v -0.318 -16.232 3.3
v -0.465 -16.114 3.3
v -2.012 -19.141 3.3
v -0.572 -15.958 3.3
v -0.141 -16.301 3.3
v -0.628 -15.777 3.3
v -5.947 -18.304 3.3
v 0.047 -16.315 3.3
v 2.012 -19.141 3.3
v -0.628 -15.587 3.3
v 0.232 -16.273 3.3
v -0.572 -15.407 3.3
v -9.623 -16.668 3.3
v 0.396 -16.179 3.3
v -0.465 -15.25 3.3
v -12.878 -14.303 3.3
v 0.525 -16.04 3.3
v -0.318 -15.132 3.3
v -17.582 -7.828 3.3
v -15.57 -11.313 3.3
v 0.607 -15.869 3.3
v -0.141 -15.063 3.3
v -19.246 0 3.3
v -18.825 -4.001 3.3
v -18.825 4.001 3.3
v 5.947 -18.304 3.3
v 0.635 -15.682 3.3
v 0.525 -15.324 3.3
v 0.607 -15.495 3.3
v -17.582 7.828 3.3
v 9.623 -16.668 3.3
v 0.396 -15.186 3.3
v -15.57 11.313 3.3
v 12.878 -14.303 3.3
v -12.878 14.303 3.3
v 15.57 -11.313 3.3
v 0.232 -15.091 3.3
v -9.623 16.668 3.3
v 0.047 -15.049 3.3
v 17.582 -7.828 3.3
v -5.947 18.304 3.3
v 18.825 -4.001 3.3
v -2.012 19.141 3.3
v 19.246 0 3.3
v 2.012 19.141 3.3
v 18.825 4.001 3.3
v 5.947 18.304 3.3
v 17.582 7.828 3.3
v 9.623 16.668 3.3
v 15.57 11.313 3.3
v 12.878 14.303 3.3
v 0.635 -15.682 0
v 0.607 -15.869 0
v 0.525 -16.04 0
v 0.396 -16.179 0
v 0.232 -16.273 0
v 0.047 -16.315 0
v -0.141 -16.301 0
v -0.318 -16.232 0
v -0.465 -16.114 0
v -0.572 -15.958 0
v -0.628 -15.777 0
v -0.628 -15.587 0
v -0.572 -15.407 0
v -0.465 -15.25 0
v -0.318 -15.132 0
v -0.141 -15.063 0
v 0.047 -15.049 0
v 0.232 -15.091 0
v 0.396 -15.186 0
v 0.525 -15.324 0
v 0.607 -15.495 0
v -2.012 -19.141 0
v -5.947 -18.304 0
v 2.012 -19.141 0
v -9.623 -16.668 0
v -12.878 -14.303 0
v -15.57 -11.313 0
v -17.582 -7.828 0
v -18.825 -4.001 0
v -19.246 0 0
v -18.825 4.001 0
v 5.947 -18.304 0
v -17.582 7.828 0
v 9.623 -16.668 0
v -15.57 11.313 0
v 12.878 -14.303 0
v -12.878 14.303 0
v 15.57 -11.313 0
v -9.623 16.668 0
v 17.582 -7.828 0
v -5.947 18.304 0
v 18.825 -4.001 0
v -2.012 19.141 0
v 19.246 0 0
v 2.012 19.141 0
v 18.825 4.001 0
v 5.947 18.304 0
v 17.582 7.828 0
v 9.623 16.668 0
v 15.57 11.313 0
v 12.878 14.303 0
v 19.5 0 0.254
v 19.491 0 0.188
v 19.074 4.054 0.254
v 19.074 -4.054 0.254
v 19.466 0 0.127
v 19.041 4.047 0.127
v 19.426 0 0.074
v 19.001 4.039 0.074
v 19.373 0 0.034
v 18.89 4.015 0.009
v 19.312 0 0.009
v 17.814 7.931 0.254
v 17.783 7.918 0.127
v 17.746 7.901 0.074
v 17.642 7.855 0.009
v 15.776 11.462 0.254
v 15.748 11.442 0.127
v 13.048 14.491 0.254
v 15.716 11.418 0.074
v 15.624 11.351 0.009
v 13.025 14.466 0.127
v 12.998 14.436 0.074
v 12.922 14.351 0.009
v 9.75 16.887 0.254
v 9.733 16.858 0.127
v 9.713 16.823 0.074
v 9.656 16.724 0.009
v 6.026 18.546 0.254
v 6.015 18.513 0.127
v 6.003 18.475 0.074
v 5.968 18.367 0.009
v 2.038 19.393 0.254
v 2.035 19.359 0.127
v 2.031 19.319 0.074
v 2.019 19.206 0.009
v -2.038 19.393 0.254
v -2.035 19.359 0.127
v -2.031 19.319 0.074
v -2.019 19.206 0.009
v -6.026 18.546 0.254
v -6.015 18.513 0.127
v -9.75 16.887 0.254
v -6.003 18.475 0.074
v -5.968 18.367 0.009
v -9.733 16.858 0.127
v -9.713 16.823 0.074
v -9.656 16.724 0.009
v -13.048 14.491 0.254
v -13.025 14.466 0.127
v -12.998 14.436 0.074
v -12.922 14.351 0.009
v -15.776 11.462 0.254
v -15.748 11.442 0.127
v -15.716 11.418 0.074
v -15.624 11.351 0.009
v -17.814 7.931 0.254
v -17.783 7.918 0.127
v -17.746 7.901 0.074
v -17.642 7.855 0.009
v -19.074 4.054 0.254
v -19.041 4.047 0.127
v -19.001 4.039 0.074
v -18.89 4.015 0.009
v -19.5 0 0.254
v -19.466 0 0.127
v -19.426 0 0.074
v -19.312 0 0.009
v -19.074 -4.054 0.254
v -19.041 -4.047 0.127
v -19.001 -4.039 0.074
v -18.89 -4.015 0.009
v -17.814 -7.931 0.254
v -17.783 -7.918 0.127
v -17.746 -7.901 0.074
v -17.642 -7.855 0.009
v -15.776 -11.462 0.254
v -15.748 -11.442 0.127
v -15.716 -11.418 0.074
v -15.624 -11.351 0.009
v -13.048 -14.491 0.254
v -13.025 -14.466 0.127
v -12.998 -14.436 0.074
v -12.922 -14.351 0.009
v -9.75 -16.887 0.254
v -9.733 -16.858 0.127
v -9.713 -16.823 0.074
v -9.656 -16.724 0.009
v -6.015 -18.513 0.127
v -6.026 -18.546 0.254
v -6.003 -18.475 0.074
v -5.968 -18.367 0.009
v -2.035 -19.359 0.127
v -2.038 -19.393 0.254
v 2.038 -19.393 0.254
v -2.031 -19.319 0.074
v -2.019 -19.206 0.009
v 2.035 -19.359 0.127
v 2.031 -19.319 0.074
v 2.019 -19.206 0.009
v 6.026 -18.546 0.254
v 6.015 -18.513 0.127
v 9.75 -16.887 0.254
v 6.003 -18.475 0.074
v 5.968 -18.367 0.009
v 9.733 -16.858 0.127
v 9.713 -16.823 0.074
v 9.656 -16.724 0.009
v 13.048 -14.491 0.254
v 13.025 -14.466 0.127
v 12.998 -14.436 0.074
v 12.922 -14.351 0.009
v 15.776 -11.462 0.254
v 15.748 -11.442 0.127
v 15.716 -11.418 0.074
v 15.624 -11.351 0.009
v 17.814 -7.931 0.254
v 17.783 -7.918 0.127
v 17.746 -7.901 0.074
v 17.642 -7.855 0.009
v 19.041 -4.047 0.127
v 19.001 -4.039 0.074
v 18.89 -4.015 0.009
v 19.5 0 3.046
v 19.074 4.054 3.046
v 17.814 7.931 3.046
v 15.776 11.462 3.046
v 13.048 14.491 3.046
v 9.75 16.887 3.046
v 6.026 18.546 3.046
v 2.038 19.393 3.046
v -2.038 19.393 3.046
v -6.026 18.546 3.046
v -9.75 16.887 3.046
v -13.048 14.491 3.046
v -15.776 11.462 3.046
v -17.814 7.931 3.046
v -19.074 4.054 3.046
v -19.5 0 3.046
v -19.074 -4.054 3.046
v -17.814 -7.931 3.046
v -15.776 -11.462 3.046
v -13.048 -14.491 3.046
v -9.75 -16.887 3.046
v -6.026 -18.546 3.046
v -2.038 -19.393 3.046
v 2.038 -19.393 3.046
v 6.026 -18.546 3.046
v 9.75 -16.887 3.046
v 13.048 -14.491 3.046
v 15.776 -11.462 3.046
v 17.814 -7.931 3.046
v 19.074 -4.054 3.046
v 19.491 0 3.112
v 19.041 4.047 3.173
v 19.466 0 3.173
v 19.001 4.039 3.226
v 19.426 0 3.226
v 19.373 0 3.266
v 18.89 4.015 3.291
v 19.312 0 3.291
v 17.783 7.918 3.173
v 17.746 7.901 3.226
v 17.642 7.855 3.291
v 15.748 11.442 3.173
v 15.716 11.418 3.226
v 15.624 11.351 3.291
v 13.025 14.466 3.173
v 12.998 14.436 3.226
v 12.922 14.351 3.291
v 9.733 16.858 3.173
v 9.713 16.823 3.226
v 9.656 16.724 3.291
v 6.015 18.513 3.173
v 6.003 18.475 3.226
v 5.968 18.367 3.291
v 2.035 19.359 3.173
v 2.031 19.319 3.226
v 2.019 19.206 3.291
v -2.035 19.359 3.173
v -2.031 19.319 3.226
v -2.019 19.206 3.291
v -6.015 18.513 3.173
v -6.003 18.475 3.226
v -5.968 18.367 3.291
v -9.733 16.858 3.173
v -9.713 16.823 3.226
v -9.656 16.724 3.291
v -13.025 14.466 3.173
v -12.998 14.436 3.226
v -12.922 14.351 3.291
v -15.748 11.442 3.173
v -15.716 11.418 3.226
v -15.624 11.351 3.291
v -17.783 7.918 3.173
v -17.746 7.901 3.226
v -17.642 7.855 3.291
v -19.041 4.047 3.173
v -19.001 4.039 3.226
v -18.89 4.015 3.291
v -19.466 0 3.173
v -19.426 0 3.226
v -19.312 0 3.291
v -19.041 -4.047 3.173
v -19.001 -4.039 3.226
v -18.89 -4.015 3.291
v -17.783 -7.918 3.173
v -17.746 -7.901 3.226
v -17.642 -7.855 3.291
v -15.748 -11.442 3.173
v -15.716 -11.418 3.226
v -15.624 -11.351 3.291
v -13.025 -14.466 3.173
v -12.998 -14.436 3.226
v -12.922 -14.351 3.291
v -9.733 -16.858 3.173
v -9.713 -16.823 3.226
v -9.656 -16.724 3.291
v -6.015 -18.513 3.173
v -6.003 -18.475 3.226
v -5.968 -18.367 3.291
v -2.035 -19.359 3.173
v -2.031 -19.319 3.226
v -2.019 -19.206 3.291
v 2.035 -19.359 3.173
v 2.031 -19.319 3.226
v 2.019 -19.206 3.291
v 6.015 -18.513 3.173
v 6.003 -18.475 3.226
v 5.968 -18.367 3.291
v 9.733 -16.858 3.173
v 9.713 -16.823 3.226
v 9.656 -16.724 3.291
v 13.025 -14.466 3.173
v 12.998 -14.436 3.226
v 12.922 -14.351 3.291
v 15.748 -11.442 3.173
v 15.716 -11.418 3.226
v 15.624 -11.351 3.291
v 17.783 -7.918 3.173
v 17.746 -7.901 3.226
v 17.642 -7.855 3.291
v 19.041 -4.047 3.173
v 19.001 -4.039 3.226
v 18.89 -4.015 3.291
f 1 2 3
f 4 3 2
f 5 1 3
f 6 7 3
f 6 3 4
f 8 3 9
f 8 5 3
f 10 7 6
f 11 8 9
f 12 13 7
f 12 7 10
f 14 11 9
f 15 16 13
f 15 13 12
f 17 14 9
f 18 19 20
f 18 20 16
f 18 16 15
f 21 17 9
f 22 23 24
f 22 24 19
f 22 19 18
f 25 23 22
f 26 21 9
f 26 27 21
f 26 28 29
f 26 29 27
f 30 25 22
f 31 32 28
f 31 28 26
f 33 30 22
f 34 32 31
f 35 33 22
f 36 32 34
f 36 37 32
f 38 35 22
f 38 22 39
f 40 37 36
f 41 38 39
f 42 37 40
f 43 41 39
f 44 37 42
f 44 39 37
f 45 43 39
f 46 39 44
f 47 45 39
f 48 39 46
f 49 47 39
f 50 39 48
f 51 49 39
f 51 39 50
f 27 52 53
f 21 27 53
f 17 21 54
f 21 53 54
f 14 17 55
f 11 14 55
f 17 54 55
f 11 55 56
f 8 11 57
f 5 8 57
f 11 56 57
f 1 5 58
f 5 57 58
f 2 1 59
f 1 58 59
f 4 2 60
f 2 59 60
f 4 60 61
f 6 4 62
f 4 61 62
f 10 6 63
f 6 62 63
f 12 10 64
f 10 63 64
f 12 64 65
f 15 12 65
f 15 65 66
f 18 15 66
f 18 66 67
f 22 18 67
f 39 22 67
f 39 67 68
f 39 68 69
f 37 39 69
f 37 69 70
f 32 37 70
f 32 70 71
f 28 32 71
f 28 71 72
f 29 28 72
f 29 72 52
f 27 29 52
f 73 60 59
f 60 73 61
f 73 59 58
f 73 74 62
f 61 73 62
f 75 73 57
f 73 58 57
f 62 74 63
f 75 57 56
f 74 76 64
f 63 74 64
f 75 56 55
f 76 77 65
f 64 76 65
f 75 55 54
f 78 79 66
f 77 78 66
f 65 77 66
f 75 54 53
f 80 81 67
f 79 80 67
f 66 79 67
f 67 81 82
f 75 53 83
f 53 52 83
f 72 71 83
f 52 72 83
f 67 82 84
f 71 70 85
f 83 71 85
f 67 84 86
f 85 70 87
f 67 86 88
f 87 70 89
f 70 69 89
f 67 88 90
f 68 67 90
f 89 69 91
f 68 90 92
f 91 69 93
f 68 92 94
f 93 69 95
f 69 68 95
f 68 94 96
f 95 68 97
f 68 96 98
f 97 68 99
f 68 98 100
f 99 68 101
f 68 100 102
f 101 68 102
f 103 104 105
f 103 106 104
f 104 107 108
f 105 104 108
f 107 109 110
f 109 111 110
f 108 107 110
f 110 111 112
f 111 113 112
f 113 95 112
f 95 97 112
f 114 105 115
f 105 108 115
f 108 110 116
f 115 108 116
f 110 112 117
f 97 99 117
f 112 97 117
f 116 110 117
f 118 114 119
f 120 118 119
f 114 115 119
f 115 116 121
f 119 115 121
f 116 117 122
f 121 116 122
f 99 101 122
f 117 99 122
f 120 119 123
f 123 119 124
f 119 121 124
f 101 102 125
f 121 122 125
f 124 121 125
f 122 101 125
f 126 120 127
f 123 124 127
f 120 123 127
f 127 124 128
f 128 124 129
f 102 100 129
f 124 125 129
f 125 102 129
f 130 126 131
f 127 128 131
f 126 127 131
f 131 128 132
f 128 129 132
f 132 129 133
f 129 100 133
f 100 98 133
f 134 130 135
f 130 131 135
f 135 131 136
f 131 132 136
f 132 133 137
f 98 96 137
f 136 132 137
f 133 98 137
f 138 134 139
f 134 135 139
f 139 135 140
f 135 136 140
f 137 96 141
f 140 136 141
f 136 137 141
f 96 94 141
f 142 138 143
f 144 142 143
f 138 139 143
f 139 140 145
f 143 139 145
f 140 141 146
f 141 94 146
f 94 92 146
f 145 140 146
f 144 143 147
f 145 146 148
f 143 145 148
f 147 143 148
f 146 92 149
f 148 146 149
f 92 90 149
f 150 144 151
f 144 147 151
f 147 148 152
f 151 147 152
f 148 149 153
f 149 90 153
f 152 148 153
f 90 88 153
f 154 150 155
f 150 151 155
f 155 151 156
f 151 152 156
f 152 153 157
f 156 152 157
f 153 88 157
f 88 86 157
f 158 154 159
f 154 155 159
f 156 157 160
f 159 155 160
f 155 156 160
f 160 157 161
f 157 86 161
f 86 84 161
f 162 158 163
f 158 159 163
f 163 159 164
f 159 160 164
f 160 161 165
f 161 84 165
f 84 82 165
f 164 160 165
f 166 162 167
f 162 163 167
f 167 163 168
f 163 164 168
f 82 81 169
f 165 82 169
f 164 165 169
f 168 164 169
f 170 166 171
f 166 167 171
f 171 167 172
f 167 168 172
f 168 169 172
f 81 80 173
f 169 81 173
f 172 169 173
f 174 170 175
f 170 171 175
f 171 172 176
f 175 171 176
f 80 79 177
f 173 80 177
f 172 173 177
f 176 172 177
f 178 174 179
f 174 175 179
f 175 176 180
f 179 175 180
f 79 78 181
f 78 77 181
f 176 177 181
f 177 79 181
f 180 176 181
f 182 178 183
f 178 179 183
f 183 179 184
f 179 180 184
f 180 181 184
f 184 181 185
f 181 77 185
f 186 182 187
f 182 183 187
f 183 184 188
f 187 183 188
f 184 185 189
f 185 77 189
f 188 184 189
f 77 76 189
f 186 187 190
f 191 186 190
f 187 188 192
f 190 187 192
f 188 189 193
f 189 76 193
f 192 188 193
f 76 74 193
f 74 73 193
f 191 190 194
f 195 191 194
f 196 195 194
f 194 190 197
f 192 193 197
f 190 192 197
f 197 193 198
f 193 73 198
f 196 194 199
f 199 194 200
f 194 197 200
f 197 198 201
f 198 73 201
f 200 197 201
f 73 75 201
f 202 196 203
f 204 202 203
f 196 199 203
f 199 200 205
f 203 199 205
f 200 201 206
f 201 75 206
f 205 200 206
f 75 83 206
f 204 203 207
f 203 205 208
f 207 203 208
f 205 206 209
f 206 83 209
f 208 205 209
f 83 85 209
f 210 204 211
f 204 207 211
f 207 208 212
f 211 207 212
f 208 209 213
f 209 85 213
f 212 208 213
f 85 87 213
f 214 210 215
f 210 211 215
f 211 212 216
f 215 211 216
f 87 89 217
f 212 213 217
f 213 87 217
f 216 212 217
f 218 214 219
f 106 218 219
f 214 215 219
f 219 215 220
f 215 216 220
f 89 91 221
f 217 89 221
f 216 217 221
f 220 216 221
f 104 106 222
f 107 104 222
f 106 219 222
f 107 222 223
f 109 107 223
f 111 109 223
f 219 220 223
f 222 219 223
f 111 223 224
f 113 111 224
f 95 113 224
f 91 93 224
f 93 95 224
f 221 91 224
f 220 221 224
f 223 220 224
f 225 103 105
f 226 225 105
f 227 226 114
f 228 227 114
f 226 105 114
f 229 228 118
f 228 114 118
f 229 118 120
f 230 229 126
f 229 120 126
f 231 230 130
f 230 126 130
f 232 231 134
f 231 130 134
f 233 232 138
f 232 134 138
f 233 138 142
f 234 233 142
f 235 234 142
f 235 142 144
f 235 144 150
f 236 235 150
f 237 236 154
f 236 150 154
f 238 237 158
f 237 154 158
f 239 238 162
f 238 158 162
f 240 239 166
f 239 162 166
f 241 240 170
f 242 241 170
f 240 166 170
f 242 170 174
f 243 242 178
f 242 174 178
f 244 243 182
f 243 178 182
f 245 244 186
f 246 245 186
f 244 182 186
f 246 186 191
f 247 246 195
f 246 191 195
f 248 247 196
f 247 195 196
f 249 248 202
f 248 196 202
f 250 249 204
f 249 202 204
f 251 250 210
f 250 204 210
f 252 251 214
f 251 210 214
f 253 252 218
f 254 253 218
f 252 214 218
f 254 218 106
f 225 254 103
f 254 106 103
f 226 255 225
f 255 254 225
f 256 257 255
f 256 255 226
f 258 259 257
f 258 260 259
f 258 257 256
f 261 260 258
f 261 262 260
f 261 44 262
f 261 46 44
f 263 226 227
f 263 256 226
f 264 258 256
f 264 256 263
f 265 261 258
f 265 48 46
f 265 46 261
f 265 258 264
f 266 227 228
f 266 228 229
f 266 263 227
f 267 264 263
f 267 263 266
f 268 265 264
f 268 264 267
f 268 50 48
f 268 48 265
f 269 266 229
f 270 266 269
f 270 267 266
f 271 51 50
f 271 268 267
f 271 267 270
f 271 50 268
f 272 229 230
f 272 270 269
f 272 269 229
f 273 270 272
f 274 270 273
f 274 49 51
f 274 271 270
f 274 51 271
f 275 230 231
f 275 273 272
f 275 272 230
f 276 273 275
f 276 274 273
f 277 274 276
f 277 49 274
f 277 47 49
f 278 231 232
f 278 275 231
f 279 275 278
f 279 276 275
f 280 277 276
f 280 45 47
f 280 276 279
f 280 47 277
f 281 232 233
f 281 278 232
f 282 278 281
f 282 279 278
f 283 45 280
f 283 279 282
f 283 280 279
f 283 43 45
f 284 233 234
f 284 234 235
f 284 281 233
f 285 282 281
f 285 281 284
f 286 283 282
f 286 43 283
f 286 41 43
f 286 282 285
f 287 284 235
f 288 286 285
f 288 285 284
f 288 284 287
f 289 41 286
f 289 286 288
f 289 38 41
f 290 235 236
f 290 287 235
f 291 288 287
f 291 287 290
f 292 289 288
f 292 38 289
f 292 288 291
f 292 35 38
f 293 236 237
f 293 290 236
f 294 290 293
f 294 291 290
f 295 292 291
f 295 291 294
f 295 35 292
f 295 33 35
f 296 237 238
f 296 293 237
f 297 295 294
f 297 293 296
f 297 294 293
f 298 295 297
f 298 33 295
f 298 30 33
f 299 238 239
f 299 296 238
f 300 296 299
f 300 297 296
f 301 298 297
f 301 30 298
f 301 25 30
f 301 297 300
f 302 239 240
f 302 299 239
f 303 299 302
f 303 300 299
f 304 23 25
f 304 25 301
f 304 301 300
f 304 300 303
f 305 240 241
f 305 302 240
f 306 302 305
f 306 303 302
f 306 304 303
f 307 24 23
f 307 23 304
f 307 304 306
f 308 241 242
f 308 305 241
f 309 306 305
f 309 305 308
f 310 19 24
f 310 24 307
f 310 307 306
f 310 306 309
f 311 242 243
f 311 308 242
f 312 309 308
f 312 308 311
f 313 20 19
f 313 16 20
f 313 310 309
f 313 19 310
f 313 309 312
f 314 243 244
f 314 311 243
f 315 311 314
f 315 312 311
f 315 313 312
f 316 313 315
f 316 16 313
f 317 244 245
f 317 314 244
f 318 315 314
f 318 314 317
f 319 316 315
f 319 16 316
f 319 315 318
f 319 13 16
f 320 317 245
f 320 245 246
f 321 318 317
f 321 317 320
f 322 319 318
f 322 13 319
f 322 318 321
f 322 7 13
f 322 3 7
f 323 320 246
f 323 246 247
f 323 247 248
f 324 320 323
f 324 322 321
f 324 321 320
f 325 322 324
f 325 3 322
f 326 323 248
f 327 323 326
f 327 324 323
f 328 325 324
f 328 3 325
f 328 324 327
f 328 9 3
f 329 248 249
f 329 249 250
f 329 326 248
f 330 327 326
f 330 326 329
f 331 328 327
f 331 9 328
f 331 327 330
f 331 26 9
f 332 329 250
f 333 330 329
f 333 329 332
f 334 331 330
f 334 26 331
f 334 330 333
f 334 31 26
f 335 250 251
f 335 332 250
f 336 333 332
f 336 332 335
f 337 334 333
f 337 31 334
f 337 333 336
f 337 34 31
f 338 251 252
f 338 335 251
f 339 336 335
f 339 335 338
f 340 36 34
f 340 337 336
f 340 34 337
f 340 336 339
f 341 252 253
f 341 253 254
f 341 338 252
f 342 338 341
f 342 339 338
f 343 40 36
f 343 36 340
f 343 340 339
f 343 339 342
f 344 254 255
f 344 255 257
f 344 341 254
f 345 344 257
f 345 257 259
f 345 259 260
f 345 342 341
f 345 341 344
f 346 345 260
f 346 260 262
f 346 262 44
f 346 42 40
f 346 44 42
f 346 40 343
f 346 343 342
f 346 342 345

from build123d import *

# Parameters (mm, degrees)
F0_R     = 19.5
F1_DEPTH = 3.3
F2_R     = 0.254
F3_R     = 0.635
F4_DEPTH = 4


with BuildPart() as f1:
    # F0 (on Top) → F1 (new body)
    with BuildSketch(Plane.XY):
        Circle(F0_R)
    extrude(amount=F1_DEPTH)

    # F2
    f2_edges = [f1.edges().sort_by_distance(p)[0] for p in [
        (-19.5, 0, 3.3),
        (-19.5, 0, 0),
    ]]
    fillet(f2_edges, radius=F2_R)

    # F3 (on face) → F4 (cut)
    with BuildSketch(Plane(origin=(0, 0, 0), x_dir=(1, 0, 0), z_dir=(0, 0, -1))):
        with Locations((0, 15.682086)):
            Circle(F3_R)
    extrude(amount=-F4_DEPTH, mode=Mode.SUBTRACT)


solid = f1.part
